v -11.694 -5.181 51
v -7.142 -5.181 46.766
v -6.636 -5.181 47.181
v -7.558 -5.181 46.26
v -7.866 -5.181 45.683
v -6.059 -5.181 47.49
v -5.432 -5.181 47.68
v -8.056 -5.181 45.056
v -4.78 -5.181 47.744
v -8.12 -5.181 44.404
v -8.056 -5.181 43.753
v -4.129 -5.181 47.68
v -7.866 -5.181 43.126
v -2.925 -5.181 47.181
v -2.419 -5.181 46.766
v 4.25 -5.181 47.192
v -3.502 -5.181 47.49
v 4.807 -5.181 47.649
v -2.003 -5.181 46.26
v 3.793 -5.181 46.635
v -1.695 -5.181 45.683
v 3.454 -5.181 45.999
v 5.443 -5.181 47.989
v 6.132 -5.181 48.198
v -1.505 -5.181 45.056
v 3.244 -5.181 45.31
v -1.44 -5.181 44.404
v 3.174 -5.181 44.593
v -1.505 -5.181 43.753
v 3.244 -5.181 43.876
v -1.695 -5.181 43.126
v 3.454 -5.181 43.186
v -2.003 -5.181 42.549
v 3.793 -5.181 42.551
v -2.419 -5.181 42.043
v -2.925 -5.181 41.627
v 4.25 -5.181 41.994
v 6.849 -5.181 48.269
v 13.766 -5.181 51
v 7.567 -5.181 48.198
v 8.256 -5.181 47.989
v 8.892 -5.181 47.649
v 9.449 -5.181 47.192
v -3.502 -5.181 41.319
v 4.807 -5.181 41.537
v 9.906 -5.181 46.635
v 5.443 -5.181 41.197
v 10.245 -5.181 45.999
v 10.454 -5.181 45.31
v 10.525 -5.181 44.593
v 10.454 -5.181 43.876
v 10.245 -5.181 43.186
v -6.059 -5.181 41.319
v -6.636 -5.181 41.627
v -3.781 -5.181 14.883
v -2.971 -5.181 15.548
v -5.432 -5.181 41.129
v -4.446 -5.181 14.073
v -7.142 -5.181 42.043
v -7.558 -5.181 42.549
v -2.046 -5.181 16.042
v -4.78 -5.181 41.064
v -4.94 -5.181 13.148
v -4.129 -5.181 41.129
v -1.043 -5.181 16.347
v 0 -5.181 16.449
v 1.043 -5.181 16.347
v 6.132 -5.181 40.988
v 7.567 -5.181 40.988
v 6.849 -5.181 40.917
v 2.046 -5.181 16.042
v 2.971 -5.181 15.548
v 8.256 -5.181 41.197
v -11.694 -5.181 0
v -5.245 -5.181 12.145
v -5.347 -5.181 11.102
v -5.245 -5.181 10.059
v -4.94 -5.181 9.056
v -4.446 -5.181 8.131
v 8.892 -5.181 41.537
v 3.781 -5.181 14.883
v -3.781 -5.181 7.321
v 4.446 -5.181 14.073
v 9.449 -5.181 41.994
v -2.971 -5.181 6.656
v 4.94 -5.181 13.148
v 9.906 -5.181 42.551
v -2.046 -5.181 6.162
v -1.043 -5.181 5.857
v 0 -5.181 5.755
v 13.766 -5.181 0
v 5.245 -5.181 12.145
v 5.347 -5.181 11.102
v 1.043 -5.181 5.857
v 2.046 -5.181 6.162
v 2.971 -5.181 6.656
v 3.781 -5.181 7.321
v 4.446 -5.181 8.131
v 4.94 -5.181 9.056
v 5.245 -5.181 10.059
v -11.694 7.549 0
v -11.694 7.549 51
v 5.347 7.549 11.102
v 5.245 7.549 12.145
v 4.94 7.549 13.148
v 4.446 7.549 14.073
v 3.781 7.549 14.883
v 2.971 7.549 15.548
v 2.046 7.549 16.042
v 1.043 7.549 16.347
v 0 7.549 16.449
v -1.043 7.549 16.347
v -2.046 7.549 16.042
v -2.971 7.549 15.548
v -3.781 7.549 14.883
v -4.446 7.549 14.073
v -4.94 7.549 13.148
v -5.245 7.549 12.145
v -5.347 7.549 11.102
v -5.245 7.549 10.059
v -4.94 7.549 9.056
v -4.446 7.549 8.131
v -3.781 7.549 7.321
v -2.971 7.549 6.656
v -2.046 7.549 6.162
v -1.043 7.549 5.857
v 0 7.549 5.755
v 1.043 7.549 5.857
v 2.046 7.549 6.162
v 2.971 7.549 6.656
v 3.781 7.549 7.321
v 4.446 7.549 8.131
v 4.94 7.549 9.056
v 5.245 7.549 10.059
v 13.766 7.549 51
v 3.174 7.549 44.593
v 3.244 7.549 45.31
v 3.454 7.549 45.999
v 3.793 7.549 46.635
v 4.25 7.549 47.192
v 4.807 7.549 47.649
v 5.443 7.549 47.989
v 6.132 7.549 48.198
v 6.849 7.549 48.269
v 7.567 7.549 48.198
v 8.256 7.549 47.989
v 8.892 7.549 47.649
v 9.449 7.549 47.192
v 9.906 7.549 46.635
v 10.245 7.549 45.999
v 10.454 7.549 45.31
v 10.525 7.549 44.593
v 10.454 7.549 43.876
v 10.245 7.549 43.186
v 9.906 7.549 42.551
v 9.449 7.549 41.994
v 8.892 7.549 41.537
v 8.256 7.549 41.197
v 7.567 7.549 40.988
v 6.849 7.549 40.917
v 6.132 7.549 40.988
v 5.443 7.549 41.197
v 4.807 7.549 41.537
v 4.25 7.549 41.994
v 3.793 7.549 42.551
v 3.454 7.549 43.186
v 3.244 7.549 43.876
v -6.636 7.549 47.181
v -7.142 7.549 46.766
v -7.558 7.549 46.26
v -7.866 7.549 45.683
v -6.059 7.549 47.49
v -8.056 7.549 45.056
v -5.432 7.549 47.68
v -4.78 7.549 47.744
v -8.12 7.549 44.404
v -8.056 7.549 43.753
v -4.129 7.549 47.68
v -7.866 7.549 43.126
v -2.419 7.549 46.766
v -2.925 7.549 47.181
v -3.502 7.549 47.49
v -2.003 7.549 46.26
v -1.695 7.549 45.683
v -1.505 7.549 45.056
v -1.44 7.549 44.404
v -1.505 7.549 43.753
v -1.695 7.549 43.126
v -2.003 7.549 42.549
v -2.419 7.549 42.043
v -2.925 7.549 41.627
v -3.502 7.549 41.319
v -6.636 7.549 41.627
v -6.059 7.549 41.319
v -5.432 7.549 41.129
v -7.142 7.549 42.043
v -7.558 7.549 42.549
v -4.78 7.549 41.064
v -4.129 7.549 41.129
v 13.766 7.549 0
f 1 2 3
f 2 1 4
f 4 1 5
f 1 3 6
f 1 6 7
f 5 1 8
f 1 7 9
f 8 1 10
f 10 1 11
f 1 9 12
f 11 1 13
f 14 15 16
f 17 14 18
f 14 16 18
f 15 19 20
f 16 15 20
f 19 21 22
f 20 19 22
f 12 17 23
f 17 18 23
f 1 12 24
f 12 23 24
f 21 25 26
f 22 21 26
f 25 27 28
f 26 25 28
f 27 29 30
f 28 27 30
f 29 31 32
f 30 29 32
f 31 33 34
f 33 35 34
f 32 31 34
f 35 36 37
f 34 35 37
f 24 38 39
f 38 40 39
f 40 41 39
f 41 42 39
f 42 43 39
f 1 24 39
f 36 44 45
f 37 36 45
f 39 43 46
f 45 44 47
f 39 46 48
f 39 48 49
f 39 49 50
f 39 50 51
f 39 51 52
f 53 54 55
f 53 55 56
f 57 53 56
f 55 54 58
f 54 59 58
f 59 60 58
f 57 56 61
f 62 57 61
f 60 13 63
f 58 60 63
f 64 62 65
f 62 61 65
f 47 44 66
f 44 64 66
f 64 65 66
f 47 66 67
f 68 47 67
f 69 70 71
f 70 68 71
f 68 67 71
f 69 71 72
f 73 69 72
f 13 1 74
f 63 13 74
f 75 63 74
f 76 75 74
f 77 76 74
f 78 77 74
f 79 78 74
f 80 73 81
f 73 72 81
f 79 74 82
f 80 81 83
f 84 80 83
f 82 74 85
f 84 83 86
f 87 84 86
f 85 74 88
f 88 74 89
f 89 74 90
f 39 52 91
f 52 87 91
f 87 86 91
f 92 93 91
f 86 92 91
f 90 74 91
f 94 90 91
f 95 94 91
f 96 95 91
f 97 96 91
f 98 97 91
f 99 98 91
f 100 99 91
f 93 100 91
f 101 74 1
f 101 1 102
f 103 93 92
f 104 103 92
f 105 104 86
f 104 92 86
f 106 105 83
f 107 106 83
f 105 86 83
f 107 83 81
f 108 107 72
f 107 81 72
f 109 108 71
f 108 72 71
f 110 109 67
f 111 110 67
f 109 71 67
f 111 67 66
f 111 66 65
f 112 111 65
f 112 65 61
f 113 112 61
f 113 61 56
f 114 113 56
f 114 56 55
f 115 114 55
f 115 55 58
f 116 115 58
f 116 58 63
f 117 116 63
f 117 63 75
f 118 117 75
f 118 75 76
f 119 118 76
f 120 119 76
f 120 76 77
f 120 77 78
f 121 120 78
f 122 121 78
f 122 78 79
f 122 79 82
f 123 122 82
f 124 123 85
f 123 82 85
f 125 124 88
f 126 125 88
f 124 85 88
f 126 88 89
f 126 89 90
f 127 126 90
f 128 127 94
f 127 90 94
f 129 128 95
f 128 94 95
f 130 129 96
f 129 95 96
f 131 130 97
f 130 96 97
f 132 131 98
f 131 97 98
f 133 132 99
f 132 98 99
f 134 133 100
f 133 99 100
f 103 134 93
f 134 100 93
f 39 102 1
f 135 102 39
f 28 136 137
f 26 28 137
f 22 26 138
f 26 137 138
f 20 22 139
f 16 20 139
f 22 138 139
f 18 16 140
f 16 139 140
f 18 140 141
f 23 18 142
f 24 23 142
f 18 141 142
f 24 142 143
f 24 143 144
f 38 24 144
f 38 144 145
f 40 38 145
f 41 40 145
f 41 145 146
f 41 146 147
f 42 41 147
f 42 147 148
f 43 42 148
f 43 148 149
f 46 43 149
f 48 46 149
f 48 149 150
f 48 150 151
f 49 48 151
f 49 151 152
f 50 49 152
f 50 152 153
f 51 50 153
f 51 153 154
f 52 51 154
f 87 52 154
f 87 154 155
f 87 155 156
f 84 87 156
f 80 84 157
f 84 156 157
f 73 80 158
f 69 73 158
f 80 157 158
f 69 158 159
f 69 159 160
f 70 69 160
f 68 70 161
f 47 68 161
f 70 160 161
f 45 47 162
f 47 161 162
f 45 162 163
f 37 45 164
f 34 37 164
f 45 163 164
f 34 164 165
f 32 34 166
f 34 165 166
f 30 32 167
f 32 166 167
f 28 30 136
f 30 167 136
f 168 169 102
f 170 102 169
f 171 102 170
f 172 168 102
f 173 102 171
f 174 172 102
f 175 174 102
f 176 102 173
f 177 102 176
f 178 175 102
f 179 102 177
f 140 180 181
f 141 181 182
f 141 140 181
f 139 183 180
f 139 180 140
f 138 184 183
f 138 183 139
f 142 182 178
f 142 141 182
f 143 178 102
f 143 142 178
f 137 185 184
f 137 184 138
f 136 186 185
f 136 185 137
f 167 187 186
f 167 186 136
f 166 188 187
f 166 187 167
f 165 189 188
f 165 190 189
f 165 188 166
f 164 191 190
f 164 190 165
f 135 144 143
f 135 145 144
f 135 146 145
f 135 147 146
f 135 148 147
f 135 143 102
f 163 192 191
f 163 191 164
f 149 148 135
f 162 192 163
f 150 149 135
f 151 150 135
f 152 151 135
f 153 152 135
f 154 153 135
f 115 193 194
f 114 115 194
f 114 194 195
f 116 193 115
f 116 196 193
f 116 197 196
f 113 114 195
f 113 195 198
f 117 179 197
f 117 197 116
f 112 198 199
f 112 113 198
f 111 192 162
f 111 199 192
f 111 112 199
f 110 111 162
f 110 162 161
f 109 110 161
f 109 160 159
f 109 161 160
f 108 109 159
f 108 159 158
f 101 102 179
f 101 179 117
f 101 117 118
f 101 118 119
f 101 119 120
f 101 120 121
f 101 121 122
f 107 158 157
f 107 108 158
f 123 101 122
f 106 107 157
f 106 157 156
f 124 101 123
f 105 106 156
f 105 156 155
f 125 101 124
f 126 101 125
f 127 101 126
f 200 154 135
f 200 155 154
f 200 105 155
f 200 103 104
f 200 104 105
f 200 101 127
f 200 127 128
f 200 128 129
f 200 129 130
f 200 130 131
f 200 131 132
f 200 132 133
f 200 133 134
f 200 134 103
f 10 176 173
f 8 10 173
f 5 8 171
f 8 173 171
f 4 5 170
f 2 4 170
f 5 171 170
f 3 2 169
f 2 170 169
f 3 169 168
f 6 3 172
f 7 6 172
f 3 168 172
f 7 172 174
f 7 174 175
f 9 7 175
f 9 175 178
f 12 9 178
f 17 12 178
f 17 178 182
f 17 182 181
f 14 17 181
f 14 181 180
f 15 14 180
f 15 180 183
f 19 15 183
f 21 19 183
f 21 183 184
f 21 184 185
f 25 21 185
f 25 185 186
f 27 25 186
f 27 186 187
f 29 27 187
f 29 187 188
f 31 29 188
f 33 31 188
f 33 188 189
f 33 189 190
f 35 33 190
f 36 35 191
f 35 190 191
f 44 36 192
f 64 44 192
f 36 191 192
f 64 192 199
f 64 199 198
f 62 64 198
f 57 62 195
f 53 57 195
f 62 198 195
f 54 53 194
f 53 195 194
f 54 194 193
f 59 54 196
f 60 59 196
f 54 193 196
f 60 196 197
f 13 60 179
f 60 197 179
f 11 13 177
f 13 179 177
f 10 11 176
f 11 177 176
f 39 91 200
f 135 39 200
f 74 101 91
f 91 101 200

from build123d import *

# Parameters (mm, degrees)
F0_W     = 25.4605272785
F0_H     = 12.7302636392
F1_DEPTH = 51
F2_R     = 3.6756964622
F3_DEPTH = 25
F4_R     = 3.3400093655
F5_DEPTH = 25
F6_R     = 5.3474190326
F7_DEPTH = 25


# Not quite as in the source:
# - a feature names something its author has since deleted; it is built from what else it names


with BuildPart() as f1:
    # F0 (on Top) → F1 (new body)
    with BuildSketch(Plane.XY):
        with Locations((1.0361843742, 1.1842104141)):
            Rectangle(F0_W, F0_H)
    extrude(amount=F1_DEPTH)

    # F2 (on face) → F3 (cut)
    with BuildSketch(Plane(origin=(0, 7.5493422337, 0), x_dir=(-1, 0, 0), z_dir=(0, 1, 0))):
        with Locations((-6.8494305015, 44.5928275585)):
            Circle(F2_R)
    extrude(amount=-F3_DEPTH, mode=Mode.SUBTRACT)

    # F4 (on face) → F5 (cut)
    with BuildSketch(Plane(origin=(0, 7.5493422337, 0), x_dir=(-1, 0, 0), z_dir=(0, 1, 0))):
        with Locations((4.7804336064, 44.4043427706)):
            Circle(F4_R)
    extrude(amount=-F5_DEPTH, mode=Mode.SUBTRACT)

    # F6 (on face) → F7 (cut)
    with BuildSketch(Plane.XZ.offset(5.1809214056)):
        with Locations((0, 11.1019741744)):
            Circle(F6_R)
    extrude(amount=-F7_DEPTH, mode=Mode.SUBTRACT)


solid = f1.part
